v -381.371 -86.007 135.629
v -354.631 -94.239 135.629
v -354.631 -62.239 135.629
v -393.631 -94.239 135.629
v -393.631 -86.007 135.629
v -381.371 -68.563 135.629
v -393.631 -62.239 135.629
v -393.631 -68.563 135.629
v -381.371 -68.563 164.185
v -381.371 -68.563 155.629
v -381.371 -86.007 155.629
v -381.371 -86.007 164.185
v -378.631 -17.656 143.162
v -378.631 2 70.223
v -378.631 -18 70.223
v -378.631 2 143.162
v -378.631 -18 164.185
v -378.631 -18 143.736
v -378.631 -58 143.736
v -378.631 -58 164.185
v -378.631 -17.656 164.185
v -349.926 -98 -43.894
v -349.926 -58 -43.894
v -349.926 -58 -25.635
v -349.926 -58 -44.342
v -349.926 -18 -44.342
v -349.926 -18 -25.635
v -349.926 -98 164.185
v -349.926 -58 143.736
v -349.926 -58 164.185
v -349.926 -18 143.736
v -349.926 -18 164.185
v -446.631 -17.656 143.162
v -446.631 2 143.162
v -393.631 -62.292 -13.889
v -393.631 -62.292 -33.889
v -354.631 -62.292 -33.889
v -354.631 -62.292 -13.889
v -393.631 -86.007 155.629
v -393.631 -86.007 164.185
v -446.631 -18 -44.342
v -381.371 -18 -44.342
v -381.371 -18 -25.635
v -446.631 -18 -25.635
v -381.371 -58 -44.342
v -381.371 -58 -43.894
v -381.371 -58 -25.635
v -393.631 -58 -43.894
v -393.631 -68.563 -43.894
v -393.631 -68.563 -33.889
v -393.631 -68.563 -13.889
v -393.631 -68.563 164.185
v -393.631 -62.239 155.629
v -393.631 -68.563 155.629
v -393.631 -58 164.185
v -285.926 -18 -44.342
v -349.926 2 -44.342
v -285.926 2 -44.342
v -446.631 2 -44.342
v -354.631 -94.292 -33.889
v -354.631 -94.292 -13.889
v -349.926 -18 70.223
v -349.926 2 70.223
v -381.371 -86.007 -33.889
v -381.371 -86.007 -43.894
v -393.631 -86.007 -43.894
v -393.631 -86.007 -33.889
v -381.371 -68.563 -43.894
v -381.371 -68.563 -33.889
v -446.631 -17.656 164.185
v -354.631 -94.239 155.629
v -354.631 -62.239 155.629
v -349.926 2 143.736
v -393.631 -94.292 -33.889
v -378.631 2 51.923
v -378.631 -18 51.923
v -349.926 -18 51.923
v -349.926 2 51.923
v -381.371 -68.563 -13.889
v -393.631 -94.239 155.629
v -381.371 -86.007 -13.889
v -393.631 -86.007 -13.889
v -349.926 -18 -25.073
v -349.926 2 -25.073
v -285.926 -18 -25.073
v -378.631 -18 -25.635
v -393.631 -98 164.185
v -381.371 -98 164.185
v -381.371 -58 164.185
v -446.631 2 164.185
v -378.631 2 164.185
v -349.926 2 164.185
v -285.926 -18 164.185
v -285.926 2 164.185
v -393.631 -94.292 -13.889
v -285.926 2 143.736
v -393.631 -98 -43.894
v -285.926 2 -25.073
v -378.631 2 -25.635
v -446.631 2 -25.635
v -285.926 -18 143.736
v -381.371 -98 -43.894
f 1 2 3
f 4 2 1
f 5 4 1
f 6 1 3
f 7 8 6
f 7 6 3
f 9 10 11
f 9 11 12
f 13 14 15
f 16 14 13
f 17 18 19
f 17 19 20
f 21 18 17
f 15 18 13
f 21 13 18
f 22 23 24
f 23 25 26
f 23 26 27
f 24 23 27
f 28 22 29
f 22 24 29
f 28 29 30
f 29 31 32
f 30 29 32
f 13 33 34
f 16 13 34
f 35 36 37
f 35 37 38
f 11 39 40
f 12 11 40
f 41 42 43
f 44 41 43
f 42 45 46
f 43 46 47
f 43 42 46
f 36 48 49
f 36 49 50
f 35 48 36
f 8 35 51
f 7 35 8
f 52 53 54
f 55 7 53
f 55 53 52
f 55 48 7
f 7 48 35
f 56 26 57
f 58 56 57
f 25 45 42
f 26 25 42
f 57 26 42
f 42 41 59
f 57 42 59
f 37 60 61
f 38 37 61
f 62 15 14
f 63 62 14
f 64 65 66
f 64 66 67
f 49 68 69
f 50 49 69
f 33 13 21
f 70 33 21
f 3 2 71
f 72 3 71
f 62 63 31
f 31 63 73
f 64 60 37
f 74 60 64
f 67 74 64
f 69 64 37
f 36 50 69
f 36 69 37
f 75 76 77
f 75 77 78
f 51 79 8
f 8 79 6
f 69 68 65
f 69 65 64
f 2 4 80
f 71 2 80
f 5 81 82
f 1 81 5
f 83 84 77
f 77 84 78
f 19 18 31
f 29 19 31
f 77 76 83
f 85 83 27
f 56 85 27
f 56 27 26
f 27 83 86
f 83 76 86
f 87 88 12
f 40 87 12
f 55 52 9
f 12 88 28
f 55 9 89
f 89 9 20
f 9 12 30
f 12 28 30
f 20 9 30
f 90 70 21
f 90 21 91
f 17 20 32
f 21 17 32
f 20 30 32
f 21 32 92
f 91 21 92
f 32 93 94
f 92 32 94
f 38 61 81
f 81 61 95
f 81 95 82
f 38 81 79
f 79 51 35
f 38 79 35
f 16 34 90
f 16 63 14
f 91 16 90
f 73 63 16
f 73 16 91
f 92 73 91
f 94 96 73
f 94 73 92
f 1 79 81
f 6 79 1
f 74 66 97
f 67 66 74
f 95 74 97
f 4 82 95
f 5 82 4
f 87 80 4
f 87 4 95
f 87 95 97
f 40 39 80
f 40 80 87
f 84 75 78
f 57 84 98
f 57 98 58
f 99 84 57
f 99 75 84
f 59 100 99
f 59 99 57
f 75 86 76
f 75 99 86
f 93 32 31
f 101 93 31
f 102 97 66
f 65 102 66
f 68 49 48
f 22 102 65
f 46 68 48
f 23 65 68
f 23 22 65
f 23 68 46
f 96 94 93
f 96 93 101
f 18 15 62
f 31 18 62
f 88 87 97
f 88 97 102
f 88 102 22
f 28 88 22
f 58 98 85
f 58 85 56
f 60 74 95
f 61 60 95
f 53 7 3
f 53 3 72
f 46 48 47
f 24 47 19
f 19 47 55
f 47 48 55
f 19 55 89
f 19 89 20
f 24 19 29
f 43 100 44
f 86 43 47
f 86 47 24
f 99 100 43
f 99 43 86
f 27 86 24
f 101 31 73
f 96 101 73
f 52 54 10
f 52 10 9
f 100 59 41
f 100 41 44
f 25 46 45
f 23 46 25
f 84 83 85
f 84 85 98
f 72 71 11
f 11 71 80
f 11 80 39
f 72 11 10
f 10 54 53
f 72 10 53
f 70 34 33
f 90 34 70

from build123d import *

# Parameters (mm, degrees)
SKETCH4_W            = 28.705590634
SKETCH4_H            = 208.526976526
BOSS_EXTRUDE5_DEPTH  = 20
SKETCH5_W            = 28.705590634
SKETCH5_H            = 20.449519005
SKETCH5_W_2          = 31.445291082
SKETCH5_H_2          = 18.706651284
BOSS_EXTRUDE6_DEPTH  = 40
SKETCH6_W            = 31.445291082
SKETCH6_H            = 208.079798694
BOSS_EXTRUDE7_DEPTH  = 40
SKETCH7_W            = 18.3
SKETCH7_H            = 20
CUT_EXTRUDE1_DEPTH   = 28.705590634
SKETCH8_W            = 208.079798694
SKETCH8_H            = 10.562870441
SKETCH8_H_2          = 11.993481809
BOSS_EXTRUDE8_DEPTH  = 15
SKETCH11_W           = 20
SKETCH11_H           = 32
CUT_EXTRUDE2_DEPTH   = 39
SKETCH12_W           = 21.023017078
SKETCH12_H           = 19.656473247
SKETCH12_W_2         = 18.706651284
SKETCH12_H_2         = 20
BOSS_EXTRUDE10_DEPTH = 68
SKETCH13_W           = 19.268882627
SKETCH13_H           = 20
SKETCH13_W_2         = 20.449519005
BOSS_EXTRUDE11_DEPTH = 64


with BuildPart() as part:
    # Sketch4 → Boss-Extrude5 (new body)
    with BuildSketch(Plane(origin=(0, -18, 0), x_dir=(1, 0, 0), z_dir=(0, 1, 0))):
        with Locations((-364.278541189, -59.921815566)):
            Rectangle(SKETCH4_W, SKETCH4_H)
    extrude(amount=BOSS_EXTRUDE5_DEPTH)

    # Sketch5 → Boss-Extrude6 (add)
    with BuildSketch(Plane.XZ.offset(18)):
        with Locations((-364.278541189, 153.960544327)):
            Rectangle(SKETCH5_W, SKETCH5_H)
        with Locations((-365.648391413, -34.988347055)):
            Rectangle(SKETCH5_W_2, SKETCH5_H_2)
    extrude(amount=BOSS_EXTRUDE6_DEPTH)

    # Sketch6 → Boss-Extrude7 (add)
    with BuildSketch(Plane.XZ.offset(58)):
        with Locations((-365.648391413, 60.145404482)):
            Rectangle(SKETCH6_W, SKETCH6_H)
    extrude(amount=BOSS_EXTRUDE7_DEPTH)

    # Sketch7 → Cut-Extrude1 (cut)
    with BuildSketch(Plane.ZY.offset(378.631336506)):
        with Locations((61.073274434, -8)):
            Rectangle(SKETCH7_W, SKETCH7_H)
    extrude(amount=-CUT_EXTRUDE1_DEPTH, mode=Mode.SUBTRACT)

    # Sketch8 → Boss-Extrude8 (add)
    with BuildSketch(Plane.ZY.offset(378.631336506)):
        with Locations((60.145404482, -63.281435221)):
            Rectangle(SKETCH8_W, SKETCH8_H)
        with Locations((60.145404482, -92.003259095)):
            Rectangle(SKETCH8_W, SKETCH8_H_2)
    extrude(amount=BOSS_EXTRUDE8_DEPTH)

    # Sketch11 → Cut-Extrude2 (cut)
    with BuildSketch(Plane.ZY.offset(393.631336506)):
        with Locations((145.629013926, -78.238745267)):
            Rectangle(SKETCH11_W, SKETCH11_H)
        with Locations((-23.889291997, -78.292410405)):
            Rectangle(SKETCH11_W, SKETCH11_H)
    extrude(amount=-CUT_EXTRUDE2_DEPTH, mode=Mode.SUBTRACT)

    # Sketch12 → Boss-Extrude10 (add)
    with BuildSketch(Plane.ZY.offset(378.631336506)):
        with Locations((153.67379529, -7.828236624)):
            Rectangle(SKETCH12_W, SKETCH12_H)
        with Locations((-34.988347055, -8)):
            Rectangle(SKETCH12_W_2, SKETCH12_H_2)
    extrude(amount=BOSS_EXTRUDE10_DEPTH)

    # Sketch13 → Boss-Extrude11 (add)
    with BuildSketch(Plane(origin=(-349.925745872, 0, 0), x_dir=(0, 0, -1), z_dir=(1, 0, 0))):
        with Locations((34.707231384, -8)):
            Rectangle(SKETCH13_W, SKETCH13_H)
        with Locations((-153.960544327, -8)):
            Rectangle(SKETCH13_W_2, SKETCH13_H)
    extrude(amount=BOSS_EXTRUDE11_DEPTH)


solid = part.part
